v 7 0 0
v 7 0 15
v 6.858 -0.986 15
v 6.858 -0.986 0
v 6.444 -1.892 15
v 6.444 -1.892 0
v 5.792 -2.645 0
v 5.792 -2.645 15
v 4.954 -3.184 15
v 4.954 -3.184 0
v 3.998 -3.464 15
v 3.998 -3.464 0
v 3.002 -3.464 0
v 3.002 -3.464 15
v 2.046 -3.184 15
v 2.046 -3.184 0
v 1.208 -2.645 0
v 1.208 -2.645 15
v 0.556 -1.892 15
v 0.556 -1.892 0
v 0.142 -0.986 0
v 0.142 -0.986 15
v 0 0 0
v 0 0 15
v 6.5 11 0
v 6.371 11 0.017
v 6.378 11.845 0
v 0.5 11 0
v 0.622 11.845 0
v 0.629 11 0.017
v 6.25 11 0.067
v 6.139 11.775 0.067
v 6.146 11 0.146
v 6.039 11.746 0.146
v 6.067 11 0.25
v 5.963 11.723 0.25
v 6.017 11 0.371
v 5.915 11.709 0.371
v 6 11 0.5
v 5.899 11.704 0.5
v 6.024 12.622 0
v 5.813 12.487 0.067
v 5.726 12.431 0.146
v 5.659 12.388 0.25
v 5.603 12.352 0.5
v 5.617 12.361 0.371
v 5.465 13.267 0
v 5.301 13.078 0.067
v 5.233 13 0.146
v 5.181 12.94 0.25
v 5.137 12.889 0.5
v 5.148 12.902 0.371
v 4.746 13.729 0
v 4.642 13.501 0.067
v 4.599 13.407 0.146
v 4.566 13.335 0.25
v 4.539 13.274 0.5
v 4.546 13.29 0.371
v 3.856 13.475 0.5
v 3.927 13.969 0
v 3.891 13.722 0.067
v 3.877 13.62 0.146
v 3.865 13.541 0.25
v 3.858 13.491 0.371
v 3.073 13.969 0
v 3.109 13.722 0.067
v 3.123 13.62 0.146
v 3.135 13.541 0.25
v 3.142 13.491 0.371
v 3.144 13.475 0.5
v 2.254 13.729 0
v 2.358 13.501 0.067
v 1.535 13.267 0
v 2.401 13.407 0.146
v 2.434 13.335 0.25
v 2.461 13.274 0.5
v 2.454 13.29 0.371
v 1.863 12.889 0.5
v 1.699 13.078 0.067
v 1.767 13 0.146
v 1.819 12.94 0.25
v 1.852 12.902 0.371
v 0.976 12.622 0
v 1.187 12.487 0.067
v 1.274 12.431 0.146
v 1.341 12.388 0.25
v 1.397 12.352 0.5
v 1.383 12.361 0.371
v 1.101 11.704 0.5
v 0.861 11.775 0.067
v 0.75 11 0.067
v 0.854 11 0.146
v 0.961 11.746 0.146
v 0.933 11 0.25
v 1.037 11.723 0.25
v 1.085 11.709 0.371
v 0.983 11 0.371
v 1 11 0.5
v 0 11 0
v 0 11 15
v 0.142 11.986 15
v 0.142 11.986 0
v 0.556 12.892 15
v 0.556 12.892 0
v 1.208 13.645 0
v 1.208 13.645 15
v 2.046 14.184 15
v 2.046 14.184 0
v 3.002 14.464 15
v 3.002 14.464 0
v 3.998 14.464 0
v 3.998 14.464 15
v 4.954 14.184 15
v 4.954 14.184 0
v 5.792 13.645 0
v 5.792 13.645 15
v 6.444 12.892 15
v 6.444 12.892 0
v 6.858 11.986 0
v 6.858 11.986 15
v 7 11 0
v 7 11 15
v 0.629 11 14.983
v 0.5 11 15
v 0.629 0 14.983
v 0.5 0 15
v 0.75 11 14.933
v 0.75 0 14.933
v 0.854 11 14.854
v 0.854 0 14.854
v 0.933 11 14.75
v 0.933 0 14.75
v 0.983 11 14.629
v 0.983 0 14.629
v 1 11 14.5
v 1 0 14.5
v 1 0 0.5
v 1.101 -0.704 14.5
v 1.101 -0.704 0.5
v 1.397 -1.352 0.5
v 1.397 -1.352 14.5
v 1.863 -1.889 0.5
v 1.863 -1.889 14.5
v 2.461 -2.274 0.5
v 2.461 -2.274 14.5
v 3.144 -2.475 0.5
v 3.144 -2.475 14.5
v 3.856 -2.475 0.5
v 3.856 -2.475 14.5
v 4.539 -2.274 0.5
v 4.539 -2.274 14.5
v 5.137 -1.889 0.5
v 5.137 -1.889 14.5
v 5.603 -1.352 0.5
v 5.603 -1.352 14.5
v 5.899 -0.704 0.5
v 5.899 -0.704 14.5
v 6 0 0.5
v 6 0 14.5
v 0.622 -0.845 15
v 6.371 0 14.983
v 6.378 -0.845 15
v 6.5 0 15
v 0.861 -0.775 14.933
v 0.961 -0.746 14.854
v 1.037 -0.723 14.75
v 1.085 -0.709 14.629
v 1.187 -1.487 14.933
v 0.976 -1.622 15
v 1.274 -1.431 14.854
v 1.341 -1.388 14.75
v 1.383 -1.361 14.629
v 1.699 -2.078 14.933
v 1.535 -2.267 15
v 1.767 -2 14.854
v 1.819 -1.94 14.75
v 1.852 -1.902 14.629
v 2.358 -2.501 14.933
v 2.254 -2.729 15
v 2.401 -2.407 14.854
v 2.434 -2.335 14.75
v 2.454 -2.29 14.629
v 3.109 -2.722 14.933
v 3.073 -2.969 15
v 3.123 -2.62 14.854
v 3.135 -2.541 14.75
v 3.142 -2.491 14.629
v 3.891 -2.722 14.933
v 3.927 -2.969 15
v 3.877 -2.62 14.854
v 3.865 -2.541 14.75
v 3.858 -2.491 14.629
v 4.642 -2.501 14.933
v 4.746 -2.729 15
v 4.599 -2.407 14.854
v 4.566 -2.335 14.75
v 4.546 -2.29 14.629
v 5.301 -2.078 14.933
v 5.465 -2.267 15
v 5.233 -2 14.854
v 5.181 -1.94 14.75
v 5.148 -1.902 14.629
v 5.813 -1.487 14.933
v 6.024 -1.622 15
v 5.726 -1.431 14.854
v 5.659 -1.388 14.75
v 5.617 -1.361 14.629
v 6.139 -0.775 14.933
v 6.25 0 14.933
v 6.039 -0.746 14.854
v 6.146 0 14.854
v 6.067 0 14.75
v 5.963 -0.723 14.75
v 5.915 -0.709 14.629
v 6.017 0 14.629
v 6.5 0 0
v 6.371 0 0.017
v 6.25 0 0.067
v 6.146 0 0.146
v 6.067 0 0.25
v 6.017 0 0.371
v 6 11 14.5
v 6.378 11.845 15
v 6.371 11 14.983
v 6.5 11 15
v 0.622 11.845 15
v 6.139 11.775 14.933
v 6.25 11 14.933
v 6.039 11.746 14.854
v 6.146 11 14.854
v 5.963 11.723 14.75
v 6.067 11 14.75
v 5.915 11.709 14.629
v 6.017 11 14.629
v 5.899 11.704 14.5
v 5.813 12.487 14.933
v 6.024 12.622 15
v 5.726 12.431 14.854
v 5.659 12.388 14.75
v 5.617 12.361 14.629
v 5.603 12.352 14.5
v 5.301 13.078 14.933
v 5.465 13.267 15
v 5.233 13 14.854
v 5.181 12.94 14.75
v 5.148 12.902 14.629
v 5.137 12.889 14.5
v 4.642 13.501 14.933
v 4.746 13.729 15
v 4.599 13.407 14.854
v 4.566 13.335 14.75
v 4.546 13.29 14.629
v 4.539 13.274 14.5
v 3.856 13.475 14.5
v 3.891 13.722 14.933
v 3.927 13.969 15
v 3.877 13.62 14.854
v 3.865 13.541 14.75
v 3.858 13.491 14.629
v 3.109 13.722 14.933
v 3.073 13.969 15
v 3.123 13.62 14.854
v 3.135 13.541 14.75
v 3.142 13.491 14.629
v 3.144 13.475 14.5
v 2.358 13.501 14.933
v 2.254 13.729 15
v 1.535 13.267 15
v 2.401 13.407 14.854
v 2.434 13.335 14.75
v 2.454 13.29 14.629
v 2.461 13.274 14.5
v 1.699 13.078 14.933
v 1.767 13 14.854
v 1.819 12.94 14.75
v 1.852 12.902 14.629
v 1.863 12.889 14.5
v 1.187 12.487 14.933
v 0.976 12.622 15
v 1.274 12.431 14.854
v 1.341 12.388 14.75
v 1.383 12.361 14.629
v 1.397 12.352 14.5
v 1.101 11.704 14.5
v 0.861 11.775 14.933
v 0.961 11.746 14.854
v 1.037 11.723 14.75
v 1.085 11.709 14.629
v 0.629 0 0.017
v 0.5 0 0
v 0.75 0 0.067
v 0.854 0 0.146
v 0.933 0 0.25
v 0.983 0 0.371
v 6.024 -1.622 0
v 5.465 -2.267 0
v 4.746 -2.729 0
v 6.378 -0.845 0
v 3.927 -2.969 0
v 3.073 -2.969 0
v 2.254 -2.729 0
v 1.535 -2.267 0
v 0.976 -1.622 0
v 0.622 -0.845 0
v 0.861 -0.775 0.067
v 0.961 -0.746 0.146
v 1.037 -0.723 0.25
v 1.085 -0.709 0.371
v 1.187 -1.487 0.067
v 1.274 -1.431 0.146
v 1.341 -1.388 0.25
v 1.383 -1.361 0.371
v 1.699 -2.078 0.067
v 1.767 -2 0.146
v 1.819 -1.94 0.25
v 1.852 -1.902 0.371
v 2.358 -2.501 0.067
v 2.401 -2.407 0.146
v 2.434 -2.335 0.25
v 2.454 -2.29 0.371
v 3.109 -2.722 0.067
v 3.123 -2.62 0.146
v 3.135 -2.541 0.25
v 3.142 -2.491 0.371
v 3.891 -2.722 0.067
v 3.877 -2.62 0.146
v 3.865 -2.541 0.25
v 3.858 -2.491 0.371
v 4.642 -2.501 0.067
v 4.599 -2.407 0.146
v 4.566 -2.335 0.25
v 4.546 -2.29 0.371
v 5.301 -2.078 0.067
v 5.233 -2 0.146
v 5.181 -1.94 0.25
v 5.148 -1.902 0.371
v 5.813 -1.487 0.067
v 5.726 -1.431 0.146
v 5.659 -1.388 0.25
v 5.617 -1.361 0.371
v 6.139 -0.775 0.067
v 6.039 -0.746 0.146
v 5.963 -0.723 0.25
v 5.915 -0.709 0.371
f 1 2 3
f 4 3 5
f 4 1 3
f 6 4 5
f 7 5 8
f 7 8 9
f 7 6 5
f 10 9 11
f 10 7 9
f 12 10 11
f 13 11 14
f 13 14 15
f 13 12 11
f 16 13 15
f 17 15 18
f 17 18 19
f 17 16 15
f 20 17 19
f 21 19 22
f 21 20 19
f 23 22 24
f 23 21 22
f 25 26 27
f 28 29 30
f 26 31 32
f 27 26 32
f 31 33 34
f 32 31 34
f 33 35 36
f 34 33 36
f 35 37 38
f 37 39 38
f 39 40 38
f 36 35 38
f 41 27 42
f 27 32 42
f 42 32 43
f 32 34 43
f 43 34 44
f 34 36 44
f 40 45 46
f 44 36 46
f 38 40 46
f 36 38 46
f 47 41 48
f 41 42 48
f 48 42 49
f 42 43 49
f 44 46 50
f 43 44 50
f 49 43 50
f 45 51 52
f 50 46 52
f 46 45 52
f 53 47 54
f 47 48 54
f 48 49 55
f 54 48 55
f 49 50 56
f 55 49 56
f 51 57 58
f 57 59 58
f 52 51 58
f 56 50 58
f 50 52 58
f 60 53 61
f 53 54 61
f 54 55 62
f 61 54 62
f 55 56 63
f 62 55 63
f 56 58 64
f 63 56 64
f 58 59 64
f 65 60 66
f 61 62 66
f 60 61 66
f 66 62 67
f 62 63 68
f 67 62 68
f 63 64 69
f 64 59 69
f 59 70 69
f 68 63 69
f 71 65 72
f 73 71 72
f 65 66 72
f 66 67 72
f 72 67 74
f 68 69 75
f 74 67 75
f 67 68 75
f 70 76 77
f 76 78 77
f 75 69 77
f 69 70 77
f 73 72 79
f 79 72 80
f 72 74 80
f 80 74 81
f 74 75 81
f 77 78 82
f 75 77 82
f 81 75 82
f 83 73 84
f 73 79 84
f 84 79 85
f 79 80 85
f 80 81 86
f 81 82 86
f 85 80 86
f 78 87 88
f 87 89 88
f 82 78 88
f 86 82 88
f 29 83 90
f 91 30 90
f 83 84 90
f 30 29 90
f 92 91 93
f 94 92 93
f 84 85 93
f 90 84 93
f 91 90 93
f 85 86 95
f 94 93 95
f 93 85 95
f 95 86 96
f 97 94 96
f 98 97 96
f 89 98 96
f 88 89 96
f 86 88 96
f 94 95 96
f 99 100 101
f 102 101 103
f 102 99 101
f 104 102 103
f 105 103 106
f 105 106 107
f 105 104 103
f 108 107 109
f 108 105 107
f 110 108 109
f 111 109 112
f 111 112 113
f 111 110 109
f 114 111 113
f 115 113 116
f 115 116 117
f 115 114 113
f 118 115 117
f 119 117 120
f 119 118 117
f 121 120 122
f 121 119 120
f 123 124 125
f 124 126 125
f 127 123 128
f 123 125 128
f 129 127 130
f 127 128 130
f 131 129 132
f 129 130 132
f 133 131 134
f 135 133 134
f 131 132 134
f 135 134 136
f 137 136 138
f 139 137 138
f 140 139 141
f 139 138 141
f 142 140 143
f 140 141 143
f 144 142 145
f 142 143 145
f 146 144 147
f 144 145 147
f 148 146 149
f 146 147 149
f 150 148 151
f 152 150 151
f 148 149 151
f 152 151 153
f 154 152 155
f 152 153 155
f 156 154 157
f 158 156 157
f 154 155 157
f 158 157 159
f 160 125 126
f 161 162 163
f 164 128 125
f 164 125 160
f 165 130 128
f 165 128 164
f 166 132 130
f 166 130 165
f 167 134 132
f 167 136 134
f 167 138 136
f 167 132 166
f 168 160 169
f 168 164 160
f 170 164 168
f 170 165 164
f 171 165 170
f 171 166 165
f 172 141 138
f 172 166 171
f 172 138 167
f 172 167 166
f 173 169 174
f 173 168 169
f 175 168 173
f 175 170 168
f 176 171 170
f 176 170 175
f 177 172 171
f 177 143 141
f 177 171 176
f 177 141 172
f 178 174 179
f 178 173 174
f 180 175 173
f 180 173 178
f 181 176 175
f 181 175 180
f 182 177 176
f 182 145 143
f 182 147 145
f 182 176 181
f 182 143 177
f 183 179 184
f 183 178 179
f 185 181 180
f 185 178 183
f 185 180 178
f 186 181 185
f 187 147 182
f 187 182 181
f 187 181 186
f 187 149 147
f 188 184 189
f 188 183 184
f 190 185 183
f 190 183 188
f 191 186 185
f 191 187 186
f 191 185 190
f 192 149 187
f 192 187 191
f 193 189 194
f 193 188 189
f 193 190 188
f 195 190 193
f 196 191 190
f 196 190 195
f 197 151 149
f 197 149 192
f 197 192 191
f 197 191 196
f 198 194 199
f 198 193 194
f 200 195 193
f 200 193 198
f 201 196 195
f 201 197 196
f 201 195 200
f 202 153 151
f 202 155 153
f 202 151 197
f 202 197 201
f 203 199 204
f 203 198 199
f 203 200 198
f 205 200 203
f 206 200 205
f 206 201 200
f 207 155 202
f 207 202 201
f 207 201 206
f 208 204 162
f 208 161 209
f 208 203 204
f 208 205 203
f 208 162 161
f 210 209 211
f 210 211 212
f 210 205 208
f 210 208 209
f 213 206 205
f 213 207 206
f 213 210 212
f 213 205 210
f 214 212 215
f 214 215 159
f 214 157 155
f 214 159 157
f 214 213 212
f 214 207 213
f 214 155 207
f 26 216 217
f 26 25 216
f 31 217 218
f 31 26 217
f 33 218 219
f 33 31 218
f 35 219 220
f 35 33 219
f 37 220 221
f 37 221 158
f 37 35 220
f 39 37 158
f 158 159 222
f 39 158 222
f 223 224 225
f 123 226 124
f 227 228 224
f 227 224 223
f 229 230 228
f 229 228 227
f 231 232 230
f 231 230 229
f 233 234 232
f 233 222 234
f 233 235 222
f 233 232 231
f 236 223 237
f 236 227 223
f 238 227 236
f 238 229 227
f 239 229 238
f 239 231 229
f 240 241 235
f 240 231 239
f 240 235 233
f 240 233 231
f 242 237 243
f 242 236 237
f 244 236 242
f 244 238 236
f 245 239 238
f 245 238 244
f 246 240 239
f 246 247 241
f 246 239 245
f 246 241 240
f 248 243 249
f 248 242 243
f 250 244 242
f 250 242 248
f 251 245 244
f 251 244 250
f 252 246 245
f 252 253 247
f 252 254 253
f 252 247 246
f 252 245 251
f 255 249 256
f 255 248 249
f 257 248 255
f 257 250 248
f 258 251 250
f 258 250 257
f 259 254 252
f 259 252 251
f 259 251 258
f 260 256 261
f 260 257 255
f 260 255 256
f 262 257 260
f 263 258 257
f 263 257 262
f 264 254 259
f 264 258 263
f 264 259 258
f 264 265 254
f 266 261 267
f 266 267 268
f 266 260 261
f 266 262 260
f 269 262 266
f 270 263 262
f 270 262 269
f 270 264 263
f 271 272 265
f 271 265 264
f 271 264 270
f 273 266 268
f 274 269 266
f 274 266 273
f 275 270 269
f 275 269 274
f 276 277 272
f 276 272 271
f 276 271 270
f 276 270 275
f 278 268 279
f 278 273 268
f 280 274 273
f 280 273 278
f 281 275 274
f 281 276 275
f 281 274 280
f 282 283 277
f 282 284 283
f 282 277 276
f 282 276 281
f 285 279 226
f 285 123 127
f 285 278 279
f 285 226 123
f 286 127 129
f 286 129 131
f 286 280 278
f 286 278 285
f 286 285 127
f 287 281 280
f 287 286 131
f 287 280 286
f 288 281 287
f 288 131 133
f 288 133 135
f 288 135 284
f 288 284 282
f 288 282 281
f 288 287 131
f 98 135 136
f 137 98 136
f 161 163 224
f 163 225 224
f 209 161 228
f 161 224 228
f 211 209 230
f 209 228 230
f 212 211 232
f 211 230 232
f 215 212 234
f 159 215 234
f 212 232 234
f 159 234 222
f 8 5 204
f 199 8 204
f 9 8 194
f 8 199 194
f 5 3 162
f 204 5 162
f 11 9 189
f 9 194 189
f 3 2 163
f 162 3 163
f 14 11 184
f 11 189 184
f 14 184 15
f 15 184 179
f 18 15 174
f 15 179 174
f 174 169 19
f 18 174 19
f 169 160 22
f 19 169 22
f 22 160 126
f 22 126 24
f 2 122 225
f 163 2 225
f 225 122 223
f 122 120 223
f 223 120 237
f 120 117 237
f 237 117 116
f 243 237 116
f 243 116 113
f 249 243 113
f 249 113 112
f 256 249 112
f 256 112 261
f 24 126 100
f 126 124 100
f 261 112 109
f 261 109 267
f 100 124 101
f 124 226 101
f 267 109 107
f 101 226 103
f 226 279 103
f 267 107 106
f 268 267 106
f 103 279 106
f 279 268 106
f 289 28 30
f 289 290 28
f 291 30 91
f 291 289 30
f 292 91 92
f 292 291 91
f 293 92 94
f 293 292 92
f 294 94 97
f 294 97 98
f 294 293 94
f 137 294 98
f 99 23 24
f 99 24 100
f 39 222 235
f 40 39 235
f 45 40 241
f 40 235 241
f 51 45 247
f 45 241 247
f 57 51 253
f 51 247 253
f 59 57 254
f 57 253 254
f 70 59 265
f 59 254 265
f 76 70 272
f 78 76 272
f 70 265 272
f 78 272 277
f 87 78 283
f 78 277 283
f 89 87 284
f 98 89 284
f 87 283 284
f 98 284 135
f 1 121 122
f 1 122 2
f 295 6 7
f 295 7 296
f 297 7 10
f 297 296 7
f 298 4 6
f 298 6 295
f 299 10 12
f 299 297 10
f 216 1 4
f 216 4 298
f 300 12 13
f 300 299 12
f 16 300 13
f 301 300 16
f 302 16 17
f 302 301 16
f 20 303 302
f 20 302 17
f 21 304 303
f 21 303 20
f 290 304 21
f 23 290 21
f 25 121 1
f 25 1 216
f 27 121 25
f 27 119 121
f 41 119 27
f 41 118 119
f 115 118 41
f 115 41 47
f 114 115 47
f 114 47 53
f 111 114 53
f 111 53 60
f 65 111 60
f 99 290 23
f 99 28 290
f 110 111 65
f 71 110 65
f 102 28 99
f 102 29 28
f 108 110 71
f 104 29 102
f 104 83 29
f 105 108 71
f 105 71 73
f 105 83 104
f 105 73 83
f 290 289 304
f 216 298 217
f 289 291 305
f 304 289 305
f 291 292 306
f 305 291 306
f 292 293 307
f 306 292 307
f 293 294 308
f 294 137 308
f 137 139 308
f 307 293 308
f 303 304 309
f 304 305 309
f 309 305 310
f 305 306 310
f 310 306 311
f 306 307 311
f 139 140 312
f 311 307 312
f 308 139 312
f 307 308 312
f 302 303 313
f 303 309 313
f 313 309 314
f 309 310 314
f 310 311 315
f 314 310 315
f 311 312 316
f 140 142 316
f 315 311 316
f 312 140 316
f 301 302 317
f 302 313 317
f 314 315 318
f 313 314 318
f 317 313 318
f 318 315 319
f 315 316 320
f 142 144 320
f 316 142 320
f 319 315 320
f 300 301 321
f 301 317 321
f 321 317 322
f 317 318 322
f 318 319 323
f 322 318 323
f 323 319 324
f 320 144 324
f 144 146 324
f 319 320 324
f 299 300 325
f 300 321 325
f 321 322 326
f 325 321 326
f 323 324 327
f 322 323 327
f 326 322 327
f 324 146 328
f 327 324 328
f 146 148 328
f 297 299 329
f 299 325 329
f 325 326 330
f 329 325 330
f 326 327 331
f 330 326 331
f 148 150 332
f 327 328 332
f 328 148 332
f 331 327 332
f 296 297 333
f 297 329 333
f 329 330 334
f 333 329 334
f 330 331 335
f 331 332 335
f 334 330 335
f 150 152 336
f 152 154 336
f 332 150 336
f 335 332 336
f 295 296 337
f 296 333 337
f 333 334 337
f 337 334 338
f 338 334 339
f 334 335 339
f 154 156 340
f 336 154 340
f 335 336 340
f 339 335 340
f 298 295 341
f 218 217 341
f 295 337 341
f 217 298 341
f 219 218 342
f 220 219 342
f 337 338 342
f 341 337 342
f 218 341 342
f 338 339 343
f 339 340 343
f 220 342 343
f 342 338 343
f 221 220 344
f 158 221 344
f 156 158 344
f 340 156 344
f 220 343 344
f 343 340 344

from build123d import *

# Parameters (mm, degrees)
BOSS_EXTRUDE1_DEPTH = 15
CUT_EXTRUDE1_DEPTH  = 23.005681085
FILLET1_R           = 0.5


with BuildPart() as part:
    # Sketch1 → Boss-Extrude1 (new body)
    with BuildSketch(Plane.XY):
        with BuildLine():
            Line((0, 0), (0, 11))
            ThreePointArc((0, 11), (3.5, 14.5), (7, 11))
            Line((7, 11), (7, 0))
            ThreePointArc((7, 0), (3.5, -3.5), (0, 0))
        make_face()
    extrude(amount=BOSS_EXTRUDE1_DEPTH)

    # Sketch2 → Cut-Extrude1 (cut, through all)
    with BuildSketch(Plane.XY.offset(15)):
        with BuildLine():
            Line((6, 0), (6, 11))
            ThreePointArc((6, 11), (3.5, 13.5), (1, 11))
            Line((1, 11), (1, 0))
            ThreePointArc((1, 0), (3.5, -2.5), (6, 0))
        make_face()
    extrude(amount=-CUT_EXTRUDE1_DEPTH, mode=Mode.SUBTRACT)

    # Fillet1
    fillet1_edges = [part.edges().sort_by_distance(p)[0] for p in [
        (3.5, -2.5, 0),
        (1, 5.5, 0),
        (3.5, 13.5, 0),
        (6, 5.5, 0),
        (3.5, -2.5, 15),
        (6, 5.5, 15),
        (3.5, 13.5, 15),
        (1, 5.5, 15),
    ]]
    fillet(fillet1_edges, radius=FILLET1_R)


solid = part.part
